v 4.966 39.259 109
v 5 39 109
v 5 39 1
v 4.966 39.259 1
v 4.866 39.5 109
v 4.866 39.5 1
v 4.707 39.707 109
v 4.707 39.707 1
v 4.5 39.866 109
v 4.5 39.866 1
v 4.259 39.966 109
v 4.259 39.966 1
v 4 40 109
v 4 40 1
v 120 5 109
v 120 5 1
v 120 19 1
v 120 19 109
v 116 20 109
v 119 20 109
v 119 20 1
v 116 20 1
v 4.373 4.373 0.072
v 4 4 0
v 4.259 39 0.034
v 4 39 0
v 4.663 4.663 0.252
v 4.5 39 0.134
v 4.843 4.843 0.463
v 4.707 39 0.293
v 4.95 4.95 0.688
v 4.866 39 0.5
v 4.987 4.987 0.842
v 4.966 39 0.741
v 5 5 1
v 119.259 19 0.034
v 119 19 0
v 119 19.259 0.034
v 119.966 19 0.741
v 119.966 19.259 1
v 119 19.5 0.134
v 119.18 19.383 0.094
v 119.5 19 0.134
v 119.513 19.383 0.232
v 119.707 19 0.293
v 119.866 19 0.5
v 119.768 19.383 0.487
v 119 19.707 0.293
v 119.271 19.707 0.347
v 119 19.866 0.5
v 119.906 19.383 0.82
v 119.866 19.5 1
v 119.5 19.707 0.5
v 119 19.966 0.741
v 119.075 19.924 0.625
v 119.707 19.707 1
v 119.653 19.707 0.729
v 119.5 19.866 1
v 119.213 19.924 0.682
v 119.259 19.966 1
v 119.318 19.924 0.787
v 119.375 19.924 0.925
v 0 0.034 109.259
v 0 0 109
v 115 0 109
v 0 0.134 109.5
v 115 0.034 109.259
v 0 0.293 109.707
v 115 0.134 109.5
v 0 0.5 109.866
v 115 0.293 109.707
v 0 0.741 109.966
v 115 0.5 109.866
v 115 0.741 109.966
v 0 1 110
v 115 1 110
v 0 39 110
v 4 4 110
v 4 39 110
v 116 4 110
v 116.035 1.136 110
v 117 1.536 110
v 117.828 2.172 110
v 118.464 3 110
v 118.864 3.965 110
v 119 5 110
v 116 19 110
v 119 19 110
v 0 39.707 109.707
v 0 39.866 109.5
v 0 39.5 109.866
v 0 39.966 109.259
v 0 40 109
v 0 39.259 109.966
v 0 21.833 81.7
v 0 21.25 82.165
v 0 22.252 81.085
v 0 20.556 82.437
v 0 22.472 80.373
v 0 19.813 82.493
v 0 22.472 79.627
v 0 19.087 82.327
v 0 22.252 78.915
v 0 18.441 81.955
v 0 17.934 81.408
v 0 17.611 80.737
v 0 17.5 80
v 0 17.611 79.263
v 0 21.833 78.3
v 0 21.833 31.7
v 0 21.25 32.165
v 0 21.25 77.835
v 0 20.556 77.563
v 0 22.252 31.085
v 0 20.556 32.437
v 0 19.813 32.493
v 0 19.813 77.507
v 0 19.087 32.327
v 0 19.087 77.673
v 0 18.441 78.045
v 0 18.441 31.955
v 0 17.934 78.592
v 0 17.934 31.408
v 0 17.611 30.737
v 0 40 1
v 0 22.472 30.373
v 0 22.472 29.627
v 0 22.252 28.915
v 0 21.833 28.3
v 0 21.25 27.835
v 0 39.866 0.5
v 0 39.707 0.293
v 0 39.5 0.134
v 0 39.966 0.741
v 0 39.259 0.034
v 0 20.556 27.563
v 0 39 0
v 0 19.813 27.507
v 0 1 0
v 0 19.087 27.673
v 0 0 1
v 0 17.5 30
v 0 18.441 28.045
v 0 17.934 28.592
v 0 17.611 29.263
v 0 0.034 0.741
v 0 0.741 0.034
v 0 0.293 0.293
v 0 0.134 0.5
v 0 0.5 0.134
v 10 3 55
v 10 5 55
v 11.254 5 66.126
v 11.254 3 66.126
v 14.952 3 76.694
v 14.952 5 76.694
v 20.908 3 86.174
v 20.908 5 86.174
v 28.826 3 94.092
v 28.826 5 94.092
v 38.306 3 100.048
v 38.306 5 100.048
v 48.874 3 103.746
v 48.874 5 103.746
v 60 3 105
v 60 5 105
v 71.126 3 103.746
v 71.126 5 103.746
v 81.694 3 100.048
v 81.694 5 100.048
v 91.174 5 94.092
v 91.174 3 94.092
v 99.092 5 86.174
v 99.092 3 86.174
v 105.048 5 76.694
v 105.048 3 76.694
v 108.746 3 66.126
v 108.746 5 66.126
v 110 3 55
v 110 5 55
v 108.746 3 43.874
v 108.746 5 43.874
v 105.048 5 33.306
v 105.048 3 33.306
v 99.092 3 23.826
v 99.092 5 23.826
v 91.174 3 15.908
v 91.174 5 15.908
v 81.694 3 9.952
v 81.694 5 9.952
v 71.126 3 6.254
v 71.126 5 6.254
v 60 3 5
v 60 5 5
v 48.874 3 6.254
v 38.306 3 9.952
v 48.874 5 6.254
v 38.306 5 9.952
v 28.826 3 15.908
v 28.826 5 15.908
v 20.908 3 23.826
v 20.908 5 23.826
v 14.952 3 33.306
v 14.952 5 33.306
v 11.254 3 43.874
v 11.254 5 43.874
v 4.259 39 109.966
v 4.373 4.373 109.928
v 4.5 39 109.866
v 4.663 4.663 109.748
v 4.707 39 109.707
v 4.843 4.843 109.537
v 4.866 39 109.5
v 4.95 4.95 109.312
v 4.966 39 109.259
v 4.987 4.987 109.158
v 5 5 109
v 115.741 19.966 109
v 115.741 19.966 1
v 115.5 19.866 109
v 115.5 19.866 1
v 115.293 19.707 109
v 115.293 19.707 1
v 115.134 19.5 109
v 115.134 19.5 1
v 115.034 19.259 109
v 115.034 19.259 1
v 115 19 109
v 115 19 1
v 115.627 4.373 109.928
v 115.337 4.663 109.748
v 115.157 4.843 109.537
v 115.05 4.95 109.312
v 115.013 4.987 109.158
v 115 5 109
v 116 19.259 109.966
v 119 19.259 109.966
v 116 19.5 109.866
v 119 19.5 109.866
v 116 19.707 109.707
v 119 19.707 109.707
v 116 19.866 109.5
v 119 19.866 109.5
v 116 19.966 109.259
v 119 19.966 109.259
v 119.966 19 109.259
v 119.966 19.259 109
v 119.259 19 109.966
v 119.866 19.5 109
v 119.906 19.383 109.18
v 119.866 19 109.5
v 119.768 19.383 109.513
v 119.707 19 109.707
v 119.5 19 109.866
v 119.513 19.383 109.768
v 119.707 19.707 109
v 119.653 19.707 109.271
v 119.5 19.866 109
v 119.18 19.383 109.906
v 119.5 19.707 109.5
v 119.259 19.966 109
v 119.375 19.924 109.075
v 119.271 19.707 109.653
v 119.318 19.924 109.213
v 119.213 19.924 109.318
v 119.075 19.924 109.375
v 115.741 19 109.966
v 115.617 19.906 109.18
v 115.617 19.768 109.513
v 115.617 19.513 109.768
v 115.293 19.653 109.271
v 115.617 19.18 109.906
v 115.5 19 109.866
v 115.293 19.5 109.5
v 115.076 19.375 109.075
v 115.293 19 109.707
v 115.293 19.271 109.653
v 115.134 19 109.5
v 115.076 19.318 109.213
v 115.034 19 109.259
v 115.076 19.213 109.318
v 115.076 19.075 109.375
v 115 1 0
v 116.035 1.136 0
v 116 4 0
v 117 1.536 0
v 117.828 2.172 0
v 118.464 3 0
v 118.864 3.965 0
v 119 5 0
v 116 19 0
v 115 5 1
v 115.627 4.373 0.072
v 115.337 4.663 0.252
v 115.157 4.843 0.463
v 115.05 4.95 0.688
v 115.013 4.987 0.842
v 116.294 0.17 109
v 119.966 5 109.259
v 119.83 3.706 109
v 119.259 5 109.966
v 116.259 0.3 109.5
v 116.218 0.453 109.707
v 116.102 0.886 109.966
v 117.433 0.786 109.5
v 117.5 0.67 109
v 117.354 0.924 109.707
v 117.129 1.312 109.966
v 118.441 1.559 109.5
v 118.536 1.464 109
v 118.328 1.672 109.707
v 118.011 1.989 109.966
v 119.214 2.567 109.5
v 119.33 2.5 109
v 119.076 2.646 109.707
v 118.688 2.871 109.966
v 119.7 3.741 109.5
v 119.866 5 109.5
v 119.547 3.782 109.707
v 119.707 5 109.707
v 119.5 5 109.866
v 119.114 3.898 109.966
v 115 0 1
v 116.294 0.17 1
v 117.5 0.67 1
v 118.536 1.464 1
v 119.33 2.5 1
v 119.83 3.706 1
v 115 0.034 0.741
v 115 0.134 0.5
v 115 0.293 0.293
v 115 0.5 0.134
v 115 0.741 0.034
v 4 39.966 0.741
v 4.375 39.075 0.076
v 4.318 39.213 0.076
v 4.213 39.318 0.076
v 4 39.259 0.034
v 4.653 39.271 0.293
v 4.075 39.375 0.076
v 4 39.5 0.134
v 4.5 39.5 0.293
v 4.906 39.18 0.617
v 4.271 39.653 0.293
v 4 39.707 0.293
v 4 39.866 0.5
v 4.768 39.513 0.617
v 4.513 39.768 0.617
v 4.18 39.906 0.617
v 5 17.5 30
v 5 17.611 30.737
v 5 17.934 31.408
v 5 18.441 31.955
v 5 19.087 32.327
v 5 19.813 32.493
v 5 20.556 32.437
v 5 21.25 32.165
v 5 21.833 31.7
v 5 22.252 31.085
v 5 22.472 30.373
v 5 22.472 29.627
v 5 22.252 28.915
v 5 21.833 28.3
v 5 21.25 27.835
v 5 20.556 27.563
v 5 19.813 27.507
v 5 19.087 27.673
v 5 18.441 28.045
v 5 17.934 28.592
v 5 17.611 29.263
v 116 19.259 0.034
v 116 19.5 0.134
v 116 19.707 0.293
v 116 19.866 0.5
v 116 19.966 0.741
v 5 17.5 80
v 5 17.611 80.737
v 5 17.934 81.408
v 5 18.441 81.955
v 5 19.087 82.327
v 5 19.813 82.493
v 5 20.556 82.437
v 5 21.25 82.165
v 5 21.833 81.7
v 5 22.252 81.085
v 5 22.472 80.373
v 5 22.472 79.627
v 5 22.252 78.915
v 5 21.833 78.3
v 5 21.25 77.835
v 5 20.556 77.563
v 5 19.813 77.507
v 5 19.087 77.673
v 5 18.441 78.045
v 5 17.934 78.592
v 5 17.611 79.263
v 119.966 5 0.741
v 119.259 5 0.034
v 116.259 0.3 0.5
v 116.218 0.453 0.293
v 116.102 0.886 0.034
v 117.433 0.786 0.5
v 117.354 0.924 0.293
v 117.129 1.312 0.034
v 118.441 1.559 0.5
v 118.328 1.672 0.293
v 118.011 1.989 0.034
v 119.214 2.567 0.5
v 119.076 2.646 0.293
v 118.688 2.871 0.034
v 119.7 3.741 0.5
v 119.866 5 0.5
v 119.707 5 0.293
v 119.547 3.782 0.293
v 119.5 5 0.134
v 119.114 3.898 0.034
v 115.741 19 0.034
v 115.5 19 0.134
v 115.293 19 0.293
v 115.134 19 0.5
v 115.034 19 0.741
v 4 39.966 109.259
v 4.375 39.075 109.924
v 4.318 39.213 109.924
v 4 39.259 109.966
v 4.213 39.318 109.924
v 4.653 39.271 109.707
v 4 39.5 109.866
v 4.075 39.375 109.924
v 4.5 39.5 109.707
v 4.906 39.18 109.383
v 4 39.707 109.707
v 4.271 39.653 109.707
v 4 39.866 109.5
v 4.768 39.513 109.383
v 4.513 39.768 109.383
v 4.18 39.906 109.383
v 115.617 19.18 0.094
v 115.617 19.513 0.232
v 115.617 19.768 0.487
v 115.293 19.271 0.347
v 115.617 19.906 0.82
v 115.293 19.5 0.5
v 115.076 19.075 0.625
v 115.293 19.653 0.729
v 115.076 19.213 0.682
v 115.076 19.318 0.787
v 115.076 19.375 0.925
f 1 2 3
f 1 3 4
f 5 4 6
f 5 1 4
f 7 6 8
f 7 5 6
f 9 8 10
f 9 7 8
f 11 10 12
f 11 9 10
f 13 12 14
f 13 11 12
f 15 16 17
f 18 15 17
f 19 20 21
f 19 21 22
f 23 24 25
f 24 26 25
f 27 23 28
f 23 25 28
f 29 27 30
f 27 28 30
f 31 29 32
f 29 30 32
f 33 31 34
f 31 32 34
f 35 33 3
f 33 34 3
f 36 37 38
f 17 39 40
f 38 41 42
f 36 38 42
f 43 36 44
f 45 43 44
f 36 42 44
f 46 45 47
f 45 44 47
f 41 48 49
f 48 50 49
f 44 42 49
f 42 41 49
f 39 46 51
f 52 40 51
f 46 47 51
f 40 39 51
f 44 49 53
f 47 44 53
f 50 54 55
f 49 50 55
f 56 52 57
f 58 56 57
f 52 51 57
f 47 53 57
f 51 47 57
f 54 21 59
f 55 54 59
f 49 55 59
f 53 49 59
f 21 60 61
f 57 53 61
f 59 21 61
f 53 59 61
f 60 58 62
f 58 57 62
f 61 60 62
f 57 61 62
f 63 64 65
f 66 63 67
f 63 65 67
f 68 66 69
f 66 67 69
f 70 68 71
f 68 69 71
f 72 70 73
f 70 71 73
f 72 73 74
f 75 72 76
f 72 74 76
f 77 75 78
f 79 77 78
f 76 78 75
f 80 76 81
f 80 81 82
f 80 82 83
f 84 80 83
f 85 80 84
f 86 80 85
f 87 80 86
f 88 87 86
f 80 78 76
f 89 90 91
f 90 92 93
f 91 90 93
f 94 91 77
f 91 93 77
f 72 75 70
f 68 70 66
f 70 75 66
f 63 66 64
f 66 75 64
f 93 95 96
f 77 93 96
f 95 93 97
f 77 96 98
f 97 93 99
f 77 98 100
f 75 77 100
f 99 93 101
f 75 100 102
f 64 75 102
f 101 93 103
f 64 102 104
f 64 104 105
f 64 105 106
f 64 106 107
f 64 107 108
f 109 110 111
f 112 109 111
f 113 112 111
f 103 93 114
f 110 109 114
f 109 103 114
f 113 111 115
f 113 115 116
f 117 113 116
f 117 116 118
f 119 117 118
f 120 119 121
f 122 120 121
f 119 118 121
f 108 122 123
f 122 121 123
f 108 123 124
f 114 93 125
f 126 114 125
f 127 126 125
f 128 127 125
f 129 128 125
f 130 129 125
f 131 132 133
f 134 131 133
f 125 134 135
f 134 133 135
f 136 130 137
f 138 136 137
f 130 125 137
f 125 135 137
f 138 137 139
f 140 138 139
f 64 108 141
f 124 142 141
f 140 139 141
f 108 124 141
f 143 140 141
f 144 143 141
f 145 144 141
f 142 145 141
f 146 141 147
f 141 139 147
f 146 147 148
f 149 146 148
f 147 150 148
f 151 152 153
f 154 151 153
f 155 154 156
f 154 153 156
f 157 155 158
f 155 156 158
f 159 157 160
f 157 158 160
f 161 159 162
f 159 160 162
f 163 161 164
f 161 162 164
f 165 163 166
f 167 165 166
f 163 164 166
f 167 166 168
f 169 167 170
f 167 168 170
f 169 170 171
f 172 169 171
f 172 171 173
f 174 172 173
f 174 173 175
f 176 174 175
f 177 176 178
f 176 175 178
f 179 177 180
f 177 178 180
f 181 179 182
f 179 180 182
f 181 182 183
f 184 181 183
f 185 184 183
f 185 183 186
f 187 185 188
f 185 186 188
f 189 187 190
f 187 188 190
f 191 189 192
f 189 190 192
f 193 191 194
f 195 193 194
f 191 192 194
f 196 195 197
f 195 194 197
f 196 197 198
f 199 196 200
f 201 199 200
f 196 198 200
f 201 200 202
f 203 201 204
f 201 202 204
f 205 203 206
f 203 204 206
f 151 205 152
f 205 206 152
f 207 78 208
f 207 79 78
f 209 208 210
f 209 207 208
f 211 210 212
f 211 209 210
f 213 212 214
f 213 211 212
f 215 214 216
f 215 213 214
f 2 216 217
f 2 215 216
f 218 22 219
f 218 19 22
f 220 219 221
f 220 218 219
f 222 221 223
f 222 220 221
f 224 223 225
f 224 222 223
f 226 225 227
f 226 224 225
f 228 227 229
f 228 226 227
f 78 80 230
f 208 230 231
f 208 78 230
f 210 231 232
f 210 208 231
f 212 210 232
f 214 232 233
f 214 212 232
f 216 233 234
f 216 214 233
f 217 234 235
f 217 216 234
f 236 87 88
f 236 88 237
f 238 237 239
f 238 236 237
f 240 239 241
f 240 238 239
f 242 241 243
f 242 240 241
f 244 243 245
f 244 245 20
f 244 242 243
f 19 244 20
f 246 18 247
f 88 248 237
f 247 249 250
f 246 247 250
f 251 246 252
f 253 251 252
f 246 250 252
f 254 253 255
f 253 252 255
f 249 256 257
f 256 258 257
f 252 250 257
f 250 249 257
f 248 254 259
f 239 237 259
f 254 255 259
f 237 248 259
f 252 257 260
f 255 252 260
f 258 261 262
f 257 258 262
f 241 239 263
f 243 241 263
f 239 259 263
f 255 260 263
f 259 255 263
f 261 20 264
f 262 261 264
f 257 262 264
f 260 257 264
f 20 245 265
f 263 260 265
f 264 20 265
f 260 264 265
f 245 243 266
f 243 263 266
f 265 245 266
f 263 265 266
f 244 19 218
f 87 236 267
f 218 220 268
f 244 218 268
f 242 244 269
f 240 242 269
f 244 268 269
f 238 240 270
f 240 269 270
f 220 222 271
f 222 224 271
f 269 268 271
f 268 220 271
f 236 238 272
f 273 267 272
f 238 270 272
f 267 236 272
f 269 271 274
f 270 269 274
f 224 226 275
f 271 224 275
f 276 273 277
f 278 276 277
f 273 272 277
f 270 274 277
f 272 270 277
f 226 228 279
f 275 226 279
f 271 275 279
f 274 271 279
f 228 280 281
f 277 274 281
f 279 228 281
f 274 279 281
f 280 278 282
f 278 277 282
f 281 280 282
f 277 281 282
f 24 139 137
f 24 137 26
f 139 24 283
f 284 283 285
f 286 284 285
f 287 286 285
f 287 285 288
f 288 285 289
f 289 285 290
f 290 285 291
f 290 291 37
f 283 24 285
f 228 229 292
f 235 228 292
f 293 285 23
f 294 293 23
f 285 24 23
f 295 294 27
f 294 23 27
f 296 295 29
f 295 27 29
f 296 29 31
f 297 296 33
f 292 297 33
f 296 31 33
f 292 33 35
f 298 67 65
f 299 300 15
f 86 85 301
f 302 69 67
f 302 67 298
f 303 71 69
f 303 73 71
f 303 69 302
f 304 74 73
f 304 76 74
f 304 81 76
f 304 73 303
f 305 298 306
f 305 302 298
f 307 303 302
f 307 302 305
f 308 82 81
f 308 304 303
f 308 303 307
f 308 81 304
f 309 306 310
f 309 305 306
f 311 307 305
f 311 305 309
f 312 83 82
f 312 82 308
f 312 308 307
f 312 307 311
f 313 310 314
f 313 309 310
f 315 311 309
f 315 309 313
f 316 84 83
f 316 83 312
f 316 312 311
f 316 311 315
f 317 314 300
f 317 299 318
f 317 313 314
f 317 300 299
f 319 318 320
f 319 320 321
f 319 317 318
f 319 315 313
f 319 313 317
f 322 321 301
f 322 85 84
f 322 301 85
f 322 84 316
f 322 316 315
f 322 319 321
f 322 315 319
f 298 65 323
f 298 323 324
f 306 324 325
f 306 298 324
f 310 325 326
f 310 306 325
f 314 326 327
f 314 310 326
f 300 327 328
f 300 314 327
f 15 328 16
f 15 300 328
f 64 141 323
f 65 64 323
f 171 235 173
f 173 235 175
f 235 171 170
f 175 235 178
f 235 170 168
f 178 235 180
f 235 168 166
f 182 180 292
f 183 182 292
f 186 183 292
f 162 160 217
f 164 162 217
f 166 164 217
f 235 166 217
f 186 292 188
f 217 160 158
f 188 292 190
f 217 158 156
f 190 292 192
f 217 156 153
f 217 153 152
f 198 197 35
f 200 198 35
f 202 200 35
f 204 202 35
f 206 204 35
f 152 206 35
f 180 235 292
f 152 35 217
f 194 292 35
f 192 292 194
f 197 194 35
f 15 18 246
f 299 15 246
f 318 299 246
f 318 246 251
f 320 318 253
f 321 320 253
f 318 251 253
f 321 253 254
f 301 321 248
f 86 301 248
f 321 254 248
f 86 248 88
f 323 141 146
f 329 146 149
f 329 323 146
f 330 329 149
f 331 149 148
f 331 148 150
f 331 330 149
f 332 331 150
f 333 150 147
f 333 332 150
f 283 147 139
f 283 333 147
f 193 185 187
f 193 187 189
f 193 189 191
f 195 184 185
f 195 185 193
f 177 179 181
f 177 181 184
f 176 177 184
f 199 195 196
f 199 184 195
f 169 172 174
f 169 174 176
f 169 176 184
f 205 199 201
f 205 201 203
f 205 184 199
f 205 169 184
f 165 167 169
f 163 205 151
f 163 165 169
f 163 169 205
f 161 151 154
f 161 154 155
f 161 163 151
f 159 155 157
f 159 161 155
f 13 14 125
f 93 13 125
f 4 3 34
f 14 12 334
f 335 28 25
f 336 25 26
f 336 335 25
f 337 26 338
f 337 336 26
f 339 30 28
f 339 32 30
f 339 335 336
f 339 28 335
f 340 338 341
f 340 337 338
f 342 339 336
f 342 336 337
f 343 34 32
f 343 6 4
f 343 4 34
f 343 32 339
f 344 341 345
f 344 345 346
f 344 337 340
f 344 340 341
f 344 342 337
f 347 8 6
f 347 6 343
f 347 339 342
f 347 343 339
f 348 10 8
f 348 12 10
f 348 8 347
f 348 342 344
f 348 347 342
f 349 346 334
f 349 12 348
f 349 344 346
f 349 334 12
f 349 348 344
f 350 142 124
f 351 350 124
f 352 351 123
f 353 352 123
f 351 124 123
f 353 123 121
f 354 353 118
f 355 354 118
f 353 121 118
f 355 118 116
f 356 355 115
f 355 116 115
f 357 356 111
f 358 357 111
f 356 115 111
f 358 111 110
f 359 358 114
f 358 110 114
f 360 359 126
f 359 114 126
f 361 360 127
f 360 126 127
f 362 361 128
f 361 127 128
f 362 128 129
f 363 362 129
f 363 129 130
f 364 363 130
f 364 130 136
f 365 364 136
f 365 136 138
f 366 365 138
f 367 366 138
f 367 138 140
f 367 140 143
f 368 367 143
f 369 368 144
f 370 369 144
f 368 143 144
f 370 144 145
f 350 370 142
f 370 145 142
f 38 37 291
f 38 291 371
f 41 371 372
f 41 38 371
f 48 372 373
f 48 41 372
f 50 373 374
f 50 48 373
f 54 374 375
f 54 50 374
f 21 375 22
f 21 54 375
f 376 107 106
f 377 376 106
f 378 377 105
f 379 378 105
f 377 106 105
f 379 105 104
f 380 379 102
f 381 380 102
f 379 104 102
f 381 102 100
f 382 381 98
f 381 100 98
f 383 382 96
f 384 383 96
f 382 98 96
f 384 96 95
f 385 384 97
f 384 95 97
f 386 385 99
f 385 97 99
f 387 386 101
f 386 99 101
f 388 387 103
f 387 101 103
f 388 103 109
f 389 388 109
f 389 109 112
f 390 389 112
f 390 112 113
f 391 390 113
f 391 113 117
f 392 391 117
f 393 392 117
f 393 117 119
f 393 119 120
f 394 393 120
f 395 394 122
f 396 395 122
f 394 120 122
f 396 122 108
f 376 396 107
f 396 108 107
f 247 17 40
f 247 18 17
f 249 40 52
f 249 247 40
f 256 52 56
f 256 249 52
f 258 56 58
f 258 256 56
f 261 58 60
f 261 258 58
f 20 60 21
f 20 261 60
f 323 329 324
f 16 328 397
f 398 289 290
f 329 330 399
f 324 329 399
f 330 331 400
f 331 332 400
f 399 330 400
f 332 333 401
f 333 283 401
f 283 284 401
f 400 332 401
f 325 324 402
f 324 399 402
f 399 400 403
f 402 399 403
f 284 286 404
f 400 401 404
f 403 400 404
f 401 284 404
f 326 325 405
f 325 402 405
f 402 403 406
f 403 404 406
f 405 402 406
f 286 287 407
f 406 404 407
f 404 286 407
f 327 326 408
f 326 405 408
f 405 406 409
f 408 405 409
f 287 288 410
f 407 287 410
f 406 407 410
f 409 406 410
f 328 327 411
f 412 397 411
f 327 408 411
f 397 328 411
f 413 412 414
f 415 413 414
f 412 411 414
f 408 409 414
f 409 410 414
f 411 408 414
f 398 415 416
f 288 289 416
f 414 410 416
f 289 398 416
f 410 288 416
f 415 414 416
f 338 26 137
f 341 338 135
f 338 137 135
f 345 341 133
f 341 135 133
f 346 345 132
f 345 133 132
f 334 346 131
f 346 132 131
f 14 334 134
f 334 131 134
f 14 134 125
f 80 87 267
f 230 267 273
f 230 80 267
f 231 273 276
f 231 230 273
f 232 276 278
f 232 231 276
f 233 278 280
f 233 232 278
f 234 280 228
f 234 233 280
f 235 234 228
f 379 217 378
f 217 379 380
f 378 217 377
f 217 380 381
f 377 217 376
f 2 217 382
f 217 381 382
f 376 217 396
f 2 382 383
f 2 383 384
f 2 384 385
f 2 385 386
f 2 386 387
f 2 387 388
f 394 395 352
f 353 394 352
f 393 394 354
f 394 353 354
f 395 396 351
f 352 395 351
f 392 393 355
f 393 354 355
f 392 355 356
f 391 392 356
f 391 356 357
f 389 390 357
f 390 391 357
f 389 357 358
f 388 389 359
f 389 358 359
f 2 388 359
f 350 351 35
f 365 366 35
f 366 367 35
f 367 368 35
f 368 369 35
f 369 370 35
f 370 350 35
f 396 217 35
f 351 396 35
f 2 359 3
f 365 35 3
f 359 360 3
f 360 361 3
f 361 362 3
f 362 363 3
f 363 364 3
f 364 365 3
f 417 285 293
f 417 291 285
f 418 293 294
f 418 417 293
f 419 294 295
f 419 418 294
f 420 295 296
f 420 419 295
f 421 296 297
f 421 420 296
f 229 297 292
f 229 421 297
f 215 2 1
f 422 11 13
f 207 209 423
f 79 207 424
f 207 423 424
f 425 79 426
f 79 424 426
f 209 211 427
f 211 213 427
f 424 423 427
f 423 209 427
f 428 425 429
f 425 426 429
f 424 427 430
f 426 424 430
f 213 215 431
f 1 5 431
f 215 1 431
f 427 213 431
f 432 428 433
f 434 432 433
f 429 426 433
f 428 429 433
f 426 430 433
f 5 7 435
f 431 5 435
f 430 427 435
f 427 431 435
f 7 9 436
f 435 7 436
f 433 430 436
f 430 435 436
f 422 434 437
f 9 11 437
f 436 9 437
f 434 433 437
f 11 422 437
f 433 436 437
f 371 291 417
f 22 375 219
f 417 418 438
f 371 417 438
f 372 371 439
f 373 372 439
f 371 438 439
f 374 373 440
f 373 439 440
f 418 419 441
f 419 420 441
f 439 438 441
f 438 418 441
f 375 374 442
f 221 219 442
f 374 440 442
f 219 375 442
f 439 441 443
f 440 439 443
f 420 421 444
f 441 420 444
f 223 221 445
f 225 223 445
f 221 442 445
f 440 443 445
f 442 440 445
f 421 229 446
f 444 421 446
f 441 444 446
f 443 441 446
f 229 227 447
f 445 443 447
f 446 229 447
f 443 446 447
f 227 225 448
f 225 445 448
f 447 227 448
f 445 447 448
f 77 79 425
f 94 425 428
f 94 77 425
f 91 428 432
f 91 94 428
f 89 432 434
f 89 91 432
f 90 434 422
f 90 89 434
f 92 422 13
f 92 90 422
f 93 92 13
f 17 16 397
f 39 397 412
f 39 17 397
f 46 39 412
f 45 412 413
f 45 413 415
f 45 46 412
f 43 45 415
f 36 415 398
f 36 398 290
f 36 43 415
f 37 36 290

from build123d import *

# Parameters (mm, degrees)
PAD_DEPTH       = 110
SKETCH001_R     = 2.5
POCKET_DEPTH    = 5
SKETCH002_R     = 50
POCKET001_DEPTH = 2
FILLET_R        = 5
FILLET001_R     = 1
FILLET002_R     = 1
FILLET003_R     = 1
FILLET004_R     = 1


with BuildPart() as part:
    # Sketch → Pad (new body)
    with BuildSketch(Plane.XY):
        Polygon((0, 40), (0, 0), (120, 0), (120, 20), (115, 20), (115, 5), (5, 5), (5, 40), align=None)
    extrude(amount=PAD_DEPTH)

    # Sketch001 (on Face1 of Pad) → Pocket (cut)
    with BuildSketch(Plane(origin=(0, 0, 0), x_dir=(0, -1, 0), z_dir=(-1, 0, 0))):
        with Locations((-20, 80)):
            Circle(SKETCH001_R)
        with Locations((-20, 30)):
            Circle(SKETCH001_R)
    extrude(amount=-POCKET_DEPTH, mode=Mode.SUBTRACT)

    # Sketch002 (on Face12 of Pocket) → Pocket001 (cut)
    with BuildSketch(Plane(origin=(0, 5, 0), x_dir=(-1, 0, 0), z_dir=(0, 1, 0))):
        with Locations((-60, 55)):
            Circle(SKETCH002_R)
    extrude(amount=-POCKET001_DEPTH, mode=Mode.SUBTRACT)

    # Fillet
    fillet_edges = [part.edges().sort_by_distance(p)[0] for p in [
        (120, 0, 55),
    ]]
    fillet(fillet_edges, radius=FILLET_R)

    # Fillet001
    fillet001_edges = [part.edges().sort_by_distance(p)[0] for p in [
        (57.5, 0, 110),
    ]]
    fillet(fillet001_edges, radius=FILLET001_R)

    # Fillet002
    fillet002_edges = [part.edges().sort_by_distance(p)[0] for p in [
        (57.5, 0, 0),
    ]]
    fillet(fillet002_edges, radius=FILLET002_R)

    # Fillet003
    fillet003_edges = [part.edges().sort_by_distance(p)[0] for p in [
        (120, 20, 55),
    ]]
    fillet(fillet003_edges, radius=FILLET003_R)

    # Fillet004
    fillet004_edges = [part.edges().sort_by_distance(p)[0] for p in [
        (115, 20, 55),
        (5, 40, 55),
        (60, 5, 110),
        (5, 22.5, 110),
        (115, 12, 110),
        (115, 12, 0),
        (60, 5, 0),
        (5, 22.5, 0),
        (2.5, 40, 0),
        (2.5, 40, 110),
    ]]
    fillet(fillet004_edges, radius=FILLET004_R)


solid = part.part
